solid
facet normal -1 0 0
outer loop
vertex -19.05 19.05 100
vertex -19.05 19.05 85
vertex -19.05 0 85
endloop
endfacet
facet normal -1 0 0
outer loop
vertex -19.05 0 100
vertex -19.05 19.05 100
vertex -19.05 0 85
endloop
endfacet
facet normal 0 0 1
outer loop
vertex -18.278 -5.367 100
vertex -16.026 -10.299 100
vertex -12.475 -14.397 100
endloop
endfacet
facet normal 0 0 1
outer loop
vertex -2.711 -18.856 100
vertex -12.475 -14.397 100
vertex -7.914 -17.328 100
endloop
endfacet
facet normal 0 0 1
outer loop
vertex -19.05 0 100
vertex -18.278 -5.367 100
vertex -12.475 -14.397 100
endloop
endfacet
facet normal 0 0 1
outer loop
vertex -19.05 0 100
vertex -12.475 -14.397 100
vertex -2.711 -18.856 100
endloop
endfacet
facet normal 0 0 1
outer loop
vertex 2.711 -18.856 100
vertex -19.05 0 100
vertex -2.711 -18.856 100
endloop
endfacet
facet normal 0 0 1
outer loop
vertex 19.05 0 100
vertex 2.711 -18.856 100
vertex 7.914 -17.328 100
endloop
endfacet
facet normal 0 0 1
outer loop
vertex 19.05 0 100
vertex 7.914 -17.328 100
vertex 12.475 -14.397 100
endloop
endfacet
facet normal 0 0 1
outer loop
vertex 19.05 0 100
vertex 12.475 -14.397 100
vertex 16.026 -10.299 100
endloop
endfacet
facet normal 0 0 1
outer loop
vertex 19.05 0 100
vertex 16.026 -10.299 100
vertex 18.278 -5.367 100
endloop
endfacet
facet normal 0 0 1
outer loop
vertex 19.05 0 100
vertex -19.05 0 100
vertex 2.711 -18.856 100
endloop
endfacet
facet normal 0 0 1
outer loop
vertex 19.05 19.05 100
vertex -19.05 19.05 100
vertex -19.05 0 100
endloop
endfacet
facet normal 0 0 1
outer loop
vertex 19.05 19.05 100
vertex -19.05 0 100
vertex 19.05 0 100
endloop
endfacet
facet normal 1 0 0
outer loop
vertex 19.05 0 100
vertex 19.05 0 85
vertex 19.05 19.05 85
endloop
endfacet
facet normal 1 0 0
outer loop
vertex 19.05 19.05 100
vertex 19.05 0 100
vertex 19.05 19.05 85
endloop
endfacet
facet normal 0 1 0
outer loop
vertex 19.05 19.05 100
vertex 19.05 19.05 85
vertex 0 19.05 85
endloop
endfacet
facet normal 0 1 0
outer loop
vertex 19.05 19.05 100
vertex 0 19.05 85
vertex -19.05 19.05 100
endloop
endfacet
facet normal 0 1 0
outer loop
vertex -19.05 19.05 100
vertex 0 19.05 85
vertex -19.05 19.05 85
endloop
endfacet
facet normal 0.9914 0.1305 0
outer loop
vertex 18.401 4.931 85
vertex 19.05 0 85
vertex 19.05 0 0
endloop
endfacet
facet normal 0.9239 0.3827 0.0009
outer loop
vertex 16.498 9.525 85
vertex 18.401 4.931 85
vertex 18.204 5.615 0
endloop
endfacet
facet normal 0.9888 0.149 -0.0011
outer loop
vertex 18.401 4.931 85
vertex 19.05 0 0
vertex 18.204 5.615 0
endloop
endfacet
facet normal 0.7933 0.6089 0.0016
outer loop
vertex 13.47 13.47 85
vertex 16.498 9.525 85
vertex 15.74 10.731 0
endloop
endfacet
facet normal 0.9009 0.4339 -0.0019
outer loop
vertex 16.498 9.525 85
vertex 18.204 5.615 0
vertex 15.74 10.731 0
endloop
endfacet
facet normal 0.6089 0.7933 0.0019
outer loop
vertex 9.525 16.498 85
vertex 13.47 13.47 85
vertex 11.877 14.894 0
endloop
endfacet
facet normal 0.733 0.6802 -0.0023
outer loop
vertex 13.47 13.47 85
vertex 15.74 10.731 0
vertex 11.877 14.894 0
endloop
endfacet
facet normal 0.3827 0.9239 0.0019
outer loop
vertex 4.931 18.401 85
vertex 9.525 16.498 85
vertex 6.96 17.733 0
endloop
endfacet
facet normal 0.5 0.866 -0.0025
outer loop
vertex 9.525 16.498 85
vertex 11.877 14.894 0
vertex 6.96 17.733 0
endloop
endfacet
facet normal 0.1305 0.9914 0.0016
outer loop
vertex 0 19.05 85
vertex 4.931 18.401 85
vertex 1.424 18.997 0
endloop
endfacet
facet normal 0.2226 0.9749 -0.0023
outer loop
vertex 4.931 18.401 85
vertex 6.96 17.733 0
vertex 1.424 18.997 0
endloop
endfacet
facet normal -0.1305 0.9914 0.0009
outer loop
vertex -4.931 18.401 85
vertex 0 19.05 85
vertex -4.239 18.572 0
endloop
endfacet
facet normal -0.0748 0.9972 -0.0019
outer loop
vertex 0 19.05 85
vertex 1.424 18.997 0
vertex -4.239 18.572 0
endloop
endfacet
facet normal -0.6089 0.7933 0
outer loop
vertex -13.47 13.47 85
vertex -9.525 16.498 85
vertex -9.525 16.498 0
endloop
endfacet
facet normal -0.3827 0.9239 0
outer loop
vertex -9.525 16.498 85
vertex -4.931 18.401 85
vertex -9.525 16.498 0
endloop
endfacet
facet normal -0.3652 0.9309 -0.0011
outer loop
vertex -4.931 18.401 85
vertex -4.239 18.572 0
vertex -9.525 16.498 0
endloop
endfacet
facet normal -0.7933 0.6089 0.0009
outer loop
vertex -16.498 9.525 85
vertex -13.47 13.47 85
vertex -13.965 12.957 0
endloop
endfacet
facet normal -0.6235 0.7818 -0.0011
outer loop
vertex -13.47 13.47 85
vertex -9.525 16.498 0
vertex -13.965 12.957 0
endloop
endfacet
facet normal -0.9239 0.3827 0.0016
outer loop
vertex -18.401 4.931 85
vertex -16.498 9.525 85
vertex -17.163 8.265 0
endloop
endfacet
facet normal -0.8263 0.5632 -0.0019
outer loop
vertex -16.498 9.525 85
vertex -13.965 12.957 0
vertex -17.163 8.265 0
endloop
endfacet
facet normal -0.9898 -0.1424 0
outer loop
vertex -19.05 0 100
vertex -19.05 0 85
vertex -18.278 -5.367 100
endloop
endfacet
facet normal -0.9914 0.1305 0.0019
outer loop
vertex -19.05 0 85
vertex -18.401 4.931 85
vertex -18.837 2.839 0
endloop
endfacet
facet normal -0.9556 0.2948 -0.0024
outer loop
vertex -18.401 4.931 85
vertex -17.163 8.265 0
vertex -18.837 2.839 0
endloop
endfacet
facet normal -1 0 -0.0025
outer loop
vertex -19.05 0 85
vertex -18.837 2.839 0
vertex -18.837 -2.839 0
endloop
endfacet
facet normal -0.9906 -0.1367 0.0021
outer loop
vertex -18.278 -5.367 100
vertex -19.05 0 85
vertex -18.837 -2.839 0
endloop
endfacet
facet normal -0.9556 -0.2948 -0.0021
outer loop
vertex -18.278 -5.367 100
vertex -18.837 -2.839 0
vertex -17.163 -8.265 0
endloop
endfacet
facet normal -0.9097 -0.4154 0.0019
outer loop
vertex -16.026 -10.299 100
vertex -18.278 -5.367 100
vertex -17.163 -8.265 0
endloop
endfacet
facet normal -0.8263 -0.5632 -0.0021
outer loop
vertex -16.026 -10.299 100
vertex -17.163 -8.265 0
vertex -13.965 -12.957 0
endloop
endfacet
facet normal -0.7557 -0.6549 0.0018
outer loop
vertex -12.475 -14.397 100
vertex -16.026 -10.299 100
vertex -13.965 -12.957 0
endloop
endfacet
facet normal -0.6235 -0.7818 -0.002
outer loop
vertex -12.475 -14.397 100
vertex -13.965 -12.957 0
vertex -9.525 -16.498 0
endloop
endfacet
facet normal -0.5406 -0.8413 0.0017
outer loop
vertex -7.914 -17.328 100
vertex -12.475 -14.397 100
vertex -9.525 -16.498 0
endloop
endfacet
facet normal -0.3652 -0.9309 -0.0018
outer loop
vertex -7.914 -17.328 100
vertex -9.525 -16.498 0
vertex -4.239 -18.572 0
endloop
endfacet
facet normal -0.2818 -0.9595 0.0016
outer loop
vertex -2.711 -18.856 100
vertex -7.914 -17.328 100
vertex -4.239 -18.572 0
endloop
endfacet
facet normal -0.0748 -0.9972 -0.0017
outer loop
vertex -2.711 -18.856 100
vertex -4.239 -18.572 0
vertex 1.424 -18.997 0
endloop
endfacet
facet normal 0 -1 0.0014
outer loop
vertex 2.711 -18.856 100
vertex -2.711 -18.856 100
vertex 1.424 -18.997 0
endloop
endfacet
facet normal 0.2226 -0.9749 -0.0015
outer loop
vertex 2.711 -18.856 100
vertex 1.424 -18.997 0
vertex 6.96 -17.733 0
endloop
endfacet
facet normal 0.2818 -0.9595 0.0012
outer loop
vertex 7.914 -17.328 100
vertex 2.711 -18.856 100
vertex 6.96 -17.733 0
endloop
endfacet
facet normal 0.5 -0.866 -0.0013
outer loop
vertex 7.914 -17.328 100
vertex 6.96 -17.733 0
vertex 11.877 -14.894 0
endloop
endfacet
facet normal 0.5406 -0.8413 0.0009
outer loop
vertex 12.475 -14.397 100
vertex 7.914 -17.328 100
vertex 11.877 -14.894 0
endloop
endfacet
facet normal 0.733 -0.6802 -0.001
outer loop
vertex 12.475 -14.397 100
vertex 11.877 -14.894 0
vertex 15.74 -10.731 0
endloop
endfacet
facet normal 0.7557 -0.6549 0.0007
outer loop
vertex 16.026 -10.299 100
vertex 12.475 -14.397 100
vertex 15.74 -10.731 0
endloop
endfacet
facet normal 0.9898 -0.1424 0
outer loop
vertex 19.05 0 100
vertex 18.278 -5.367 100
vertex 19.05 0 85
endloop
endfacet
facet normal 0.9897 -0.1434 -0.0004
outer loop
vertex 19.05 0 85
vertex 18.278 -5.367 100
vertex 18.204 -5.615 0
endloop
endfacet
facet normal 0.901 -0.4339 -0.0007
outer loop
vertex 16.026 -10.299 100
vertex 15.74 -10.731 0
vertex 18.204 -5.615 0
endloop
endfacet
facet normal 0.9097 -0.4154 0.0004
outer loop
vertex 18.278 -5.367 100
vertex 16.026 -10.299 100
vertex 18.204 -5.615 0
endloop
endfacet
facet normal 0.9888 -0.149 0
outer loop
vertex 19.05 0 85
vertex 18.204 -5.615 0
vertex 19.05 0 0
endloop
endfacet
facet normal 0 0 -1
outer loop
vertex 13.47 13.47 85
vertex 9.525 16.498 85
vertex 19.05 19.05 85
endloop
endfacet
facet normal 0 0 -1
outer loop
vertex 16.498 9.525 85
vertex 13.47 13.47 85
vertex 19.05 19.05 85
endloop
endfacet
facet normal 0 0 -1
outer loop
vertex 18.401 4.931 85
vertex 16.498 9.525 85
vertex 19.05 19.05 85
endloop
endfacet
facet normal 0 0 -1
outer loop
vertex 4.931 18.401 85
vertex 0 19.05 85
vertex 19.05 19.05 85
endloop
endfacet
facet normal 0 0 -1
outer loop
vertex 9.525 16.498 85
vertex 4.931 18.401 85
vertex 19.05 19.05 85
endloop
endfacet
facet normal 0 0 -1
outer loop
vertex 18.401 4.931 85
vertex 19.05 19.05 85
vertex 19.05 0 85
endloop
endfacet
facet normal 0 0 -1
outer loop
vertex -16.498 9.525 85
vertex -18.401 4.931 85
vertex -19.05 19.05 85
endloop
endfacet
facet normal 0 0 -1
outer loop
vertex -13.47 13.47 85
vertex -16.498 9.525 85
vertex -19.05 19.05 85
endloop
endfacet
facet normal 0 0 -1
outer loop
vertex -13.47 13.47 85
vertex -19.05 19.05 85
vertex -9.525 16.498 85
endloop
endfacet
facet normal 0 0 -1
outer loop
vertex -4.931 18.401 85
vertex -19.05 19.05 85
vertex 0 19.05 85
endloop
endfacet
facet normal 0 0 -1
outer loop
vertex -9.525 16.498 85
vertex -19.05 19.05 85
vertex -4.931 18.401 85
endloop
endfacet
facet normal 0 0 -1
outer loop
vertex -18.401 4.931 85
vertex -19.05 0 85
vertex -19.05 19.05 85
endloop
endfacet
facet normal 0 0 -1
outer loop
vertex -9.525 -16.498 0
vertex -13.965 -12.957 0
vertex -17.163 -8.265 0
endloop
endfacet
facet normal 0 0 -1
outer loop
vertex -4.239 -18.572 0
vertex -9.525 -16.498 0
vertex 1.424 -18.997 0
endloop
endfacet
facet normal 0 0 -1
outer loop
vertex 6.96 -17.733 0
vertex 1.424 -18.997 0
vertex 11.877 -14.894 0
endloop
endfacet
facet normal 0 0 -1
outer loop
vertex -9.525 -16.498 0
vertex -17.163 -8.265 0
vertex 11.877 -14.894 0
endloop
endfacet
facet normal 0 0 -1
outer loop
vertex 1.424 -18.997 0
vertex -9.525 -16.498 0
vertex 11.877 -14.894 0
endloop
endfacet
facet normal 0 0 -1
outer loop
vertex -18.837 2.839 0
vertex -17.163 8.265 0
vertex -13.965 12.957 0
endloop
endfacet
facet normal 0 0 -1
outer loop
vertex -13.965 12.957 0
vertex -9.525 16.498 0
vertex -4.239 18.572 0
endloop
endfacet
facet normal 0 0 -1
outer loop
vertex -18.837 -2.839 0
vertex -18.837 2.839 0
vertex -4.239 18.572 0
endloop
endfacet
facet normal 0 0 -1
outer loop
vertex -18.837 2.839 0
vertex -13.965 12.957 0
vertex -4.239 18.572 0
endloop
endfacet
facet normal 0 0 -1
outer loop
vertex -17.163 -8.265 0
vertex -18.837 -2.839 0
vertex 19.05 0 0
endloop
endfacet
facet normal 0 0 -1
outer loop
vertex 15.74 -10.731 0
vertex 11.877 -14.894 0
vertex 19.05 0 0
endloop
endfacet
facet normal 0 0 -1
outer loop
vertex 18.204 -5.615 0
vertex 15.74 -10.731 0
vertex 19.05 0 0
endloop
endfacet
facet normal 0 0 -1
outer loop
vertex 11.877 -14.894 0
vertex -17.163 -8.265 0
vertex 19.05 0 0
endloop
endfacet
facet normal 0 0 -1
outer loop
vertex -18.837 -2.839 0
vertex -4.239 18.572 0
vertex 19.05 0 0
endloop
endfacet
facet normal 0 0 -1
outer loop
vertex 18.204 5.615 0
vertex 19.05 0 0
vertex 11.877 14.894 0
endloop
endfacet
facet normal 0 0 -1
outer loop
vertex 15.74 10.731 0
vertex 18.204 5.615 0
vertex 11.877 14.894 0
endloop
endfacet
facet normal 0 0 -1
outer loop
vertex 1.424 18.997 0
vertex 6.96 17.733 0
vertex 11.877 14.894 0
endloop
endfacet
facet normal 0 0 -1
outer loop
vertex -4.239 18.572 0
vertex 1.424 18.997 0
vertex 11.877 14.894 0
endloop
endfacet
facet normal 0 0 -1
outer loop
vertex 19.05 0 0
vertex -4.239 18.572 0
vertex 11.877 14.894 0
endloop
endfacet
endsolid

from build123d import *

# Parameters (mm, degrees)
CROQUIS1_R              = 19.05
SALIENTE_EXTRUIR1_DEPTH = 100
SALIENTE_EXTRUIR2_START = -15
SALIENTE_EXTRUIR2_DEPTH = 15


with BuildPart() as part:
    # Croquis1 → Saliente-Extruir1 (new body)
    with BuildSketch(Plane.XY):
        Circle(CROQUIS1_R)
    extrude(amount=SALIENTE_EXTRUIR1_DEPTH)

    # Croquis2 → Saliente-Extruir2 (add)
    with BuildSketch(Plane.XY.offset(100).offset(SALIENTE_EXTRUIR2_START)):
        with BuildLine():
            Line((19.05, 19.05), (0, 19.05))
            ThreePointArc((0, 19.05), (13.470384182, 13.470384182), (19.05, 0))
            Line((19.05, 0), (19.05, 19.05))
        make_face()
        with BuildLine():
            ThreePointArc((-19.05, 0), (-13.470384182, 13.470384182), (0, 19.05))
            Line((0, 19.05), (-19.05, 19.05))
            Line((-19.05, 19.05), (-19.05, 0))
        make_face()
    extrude(amount=SALIENTE_EXTRUIR2_DEPTH)


solid = part.part
